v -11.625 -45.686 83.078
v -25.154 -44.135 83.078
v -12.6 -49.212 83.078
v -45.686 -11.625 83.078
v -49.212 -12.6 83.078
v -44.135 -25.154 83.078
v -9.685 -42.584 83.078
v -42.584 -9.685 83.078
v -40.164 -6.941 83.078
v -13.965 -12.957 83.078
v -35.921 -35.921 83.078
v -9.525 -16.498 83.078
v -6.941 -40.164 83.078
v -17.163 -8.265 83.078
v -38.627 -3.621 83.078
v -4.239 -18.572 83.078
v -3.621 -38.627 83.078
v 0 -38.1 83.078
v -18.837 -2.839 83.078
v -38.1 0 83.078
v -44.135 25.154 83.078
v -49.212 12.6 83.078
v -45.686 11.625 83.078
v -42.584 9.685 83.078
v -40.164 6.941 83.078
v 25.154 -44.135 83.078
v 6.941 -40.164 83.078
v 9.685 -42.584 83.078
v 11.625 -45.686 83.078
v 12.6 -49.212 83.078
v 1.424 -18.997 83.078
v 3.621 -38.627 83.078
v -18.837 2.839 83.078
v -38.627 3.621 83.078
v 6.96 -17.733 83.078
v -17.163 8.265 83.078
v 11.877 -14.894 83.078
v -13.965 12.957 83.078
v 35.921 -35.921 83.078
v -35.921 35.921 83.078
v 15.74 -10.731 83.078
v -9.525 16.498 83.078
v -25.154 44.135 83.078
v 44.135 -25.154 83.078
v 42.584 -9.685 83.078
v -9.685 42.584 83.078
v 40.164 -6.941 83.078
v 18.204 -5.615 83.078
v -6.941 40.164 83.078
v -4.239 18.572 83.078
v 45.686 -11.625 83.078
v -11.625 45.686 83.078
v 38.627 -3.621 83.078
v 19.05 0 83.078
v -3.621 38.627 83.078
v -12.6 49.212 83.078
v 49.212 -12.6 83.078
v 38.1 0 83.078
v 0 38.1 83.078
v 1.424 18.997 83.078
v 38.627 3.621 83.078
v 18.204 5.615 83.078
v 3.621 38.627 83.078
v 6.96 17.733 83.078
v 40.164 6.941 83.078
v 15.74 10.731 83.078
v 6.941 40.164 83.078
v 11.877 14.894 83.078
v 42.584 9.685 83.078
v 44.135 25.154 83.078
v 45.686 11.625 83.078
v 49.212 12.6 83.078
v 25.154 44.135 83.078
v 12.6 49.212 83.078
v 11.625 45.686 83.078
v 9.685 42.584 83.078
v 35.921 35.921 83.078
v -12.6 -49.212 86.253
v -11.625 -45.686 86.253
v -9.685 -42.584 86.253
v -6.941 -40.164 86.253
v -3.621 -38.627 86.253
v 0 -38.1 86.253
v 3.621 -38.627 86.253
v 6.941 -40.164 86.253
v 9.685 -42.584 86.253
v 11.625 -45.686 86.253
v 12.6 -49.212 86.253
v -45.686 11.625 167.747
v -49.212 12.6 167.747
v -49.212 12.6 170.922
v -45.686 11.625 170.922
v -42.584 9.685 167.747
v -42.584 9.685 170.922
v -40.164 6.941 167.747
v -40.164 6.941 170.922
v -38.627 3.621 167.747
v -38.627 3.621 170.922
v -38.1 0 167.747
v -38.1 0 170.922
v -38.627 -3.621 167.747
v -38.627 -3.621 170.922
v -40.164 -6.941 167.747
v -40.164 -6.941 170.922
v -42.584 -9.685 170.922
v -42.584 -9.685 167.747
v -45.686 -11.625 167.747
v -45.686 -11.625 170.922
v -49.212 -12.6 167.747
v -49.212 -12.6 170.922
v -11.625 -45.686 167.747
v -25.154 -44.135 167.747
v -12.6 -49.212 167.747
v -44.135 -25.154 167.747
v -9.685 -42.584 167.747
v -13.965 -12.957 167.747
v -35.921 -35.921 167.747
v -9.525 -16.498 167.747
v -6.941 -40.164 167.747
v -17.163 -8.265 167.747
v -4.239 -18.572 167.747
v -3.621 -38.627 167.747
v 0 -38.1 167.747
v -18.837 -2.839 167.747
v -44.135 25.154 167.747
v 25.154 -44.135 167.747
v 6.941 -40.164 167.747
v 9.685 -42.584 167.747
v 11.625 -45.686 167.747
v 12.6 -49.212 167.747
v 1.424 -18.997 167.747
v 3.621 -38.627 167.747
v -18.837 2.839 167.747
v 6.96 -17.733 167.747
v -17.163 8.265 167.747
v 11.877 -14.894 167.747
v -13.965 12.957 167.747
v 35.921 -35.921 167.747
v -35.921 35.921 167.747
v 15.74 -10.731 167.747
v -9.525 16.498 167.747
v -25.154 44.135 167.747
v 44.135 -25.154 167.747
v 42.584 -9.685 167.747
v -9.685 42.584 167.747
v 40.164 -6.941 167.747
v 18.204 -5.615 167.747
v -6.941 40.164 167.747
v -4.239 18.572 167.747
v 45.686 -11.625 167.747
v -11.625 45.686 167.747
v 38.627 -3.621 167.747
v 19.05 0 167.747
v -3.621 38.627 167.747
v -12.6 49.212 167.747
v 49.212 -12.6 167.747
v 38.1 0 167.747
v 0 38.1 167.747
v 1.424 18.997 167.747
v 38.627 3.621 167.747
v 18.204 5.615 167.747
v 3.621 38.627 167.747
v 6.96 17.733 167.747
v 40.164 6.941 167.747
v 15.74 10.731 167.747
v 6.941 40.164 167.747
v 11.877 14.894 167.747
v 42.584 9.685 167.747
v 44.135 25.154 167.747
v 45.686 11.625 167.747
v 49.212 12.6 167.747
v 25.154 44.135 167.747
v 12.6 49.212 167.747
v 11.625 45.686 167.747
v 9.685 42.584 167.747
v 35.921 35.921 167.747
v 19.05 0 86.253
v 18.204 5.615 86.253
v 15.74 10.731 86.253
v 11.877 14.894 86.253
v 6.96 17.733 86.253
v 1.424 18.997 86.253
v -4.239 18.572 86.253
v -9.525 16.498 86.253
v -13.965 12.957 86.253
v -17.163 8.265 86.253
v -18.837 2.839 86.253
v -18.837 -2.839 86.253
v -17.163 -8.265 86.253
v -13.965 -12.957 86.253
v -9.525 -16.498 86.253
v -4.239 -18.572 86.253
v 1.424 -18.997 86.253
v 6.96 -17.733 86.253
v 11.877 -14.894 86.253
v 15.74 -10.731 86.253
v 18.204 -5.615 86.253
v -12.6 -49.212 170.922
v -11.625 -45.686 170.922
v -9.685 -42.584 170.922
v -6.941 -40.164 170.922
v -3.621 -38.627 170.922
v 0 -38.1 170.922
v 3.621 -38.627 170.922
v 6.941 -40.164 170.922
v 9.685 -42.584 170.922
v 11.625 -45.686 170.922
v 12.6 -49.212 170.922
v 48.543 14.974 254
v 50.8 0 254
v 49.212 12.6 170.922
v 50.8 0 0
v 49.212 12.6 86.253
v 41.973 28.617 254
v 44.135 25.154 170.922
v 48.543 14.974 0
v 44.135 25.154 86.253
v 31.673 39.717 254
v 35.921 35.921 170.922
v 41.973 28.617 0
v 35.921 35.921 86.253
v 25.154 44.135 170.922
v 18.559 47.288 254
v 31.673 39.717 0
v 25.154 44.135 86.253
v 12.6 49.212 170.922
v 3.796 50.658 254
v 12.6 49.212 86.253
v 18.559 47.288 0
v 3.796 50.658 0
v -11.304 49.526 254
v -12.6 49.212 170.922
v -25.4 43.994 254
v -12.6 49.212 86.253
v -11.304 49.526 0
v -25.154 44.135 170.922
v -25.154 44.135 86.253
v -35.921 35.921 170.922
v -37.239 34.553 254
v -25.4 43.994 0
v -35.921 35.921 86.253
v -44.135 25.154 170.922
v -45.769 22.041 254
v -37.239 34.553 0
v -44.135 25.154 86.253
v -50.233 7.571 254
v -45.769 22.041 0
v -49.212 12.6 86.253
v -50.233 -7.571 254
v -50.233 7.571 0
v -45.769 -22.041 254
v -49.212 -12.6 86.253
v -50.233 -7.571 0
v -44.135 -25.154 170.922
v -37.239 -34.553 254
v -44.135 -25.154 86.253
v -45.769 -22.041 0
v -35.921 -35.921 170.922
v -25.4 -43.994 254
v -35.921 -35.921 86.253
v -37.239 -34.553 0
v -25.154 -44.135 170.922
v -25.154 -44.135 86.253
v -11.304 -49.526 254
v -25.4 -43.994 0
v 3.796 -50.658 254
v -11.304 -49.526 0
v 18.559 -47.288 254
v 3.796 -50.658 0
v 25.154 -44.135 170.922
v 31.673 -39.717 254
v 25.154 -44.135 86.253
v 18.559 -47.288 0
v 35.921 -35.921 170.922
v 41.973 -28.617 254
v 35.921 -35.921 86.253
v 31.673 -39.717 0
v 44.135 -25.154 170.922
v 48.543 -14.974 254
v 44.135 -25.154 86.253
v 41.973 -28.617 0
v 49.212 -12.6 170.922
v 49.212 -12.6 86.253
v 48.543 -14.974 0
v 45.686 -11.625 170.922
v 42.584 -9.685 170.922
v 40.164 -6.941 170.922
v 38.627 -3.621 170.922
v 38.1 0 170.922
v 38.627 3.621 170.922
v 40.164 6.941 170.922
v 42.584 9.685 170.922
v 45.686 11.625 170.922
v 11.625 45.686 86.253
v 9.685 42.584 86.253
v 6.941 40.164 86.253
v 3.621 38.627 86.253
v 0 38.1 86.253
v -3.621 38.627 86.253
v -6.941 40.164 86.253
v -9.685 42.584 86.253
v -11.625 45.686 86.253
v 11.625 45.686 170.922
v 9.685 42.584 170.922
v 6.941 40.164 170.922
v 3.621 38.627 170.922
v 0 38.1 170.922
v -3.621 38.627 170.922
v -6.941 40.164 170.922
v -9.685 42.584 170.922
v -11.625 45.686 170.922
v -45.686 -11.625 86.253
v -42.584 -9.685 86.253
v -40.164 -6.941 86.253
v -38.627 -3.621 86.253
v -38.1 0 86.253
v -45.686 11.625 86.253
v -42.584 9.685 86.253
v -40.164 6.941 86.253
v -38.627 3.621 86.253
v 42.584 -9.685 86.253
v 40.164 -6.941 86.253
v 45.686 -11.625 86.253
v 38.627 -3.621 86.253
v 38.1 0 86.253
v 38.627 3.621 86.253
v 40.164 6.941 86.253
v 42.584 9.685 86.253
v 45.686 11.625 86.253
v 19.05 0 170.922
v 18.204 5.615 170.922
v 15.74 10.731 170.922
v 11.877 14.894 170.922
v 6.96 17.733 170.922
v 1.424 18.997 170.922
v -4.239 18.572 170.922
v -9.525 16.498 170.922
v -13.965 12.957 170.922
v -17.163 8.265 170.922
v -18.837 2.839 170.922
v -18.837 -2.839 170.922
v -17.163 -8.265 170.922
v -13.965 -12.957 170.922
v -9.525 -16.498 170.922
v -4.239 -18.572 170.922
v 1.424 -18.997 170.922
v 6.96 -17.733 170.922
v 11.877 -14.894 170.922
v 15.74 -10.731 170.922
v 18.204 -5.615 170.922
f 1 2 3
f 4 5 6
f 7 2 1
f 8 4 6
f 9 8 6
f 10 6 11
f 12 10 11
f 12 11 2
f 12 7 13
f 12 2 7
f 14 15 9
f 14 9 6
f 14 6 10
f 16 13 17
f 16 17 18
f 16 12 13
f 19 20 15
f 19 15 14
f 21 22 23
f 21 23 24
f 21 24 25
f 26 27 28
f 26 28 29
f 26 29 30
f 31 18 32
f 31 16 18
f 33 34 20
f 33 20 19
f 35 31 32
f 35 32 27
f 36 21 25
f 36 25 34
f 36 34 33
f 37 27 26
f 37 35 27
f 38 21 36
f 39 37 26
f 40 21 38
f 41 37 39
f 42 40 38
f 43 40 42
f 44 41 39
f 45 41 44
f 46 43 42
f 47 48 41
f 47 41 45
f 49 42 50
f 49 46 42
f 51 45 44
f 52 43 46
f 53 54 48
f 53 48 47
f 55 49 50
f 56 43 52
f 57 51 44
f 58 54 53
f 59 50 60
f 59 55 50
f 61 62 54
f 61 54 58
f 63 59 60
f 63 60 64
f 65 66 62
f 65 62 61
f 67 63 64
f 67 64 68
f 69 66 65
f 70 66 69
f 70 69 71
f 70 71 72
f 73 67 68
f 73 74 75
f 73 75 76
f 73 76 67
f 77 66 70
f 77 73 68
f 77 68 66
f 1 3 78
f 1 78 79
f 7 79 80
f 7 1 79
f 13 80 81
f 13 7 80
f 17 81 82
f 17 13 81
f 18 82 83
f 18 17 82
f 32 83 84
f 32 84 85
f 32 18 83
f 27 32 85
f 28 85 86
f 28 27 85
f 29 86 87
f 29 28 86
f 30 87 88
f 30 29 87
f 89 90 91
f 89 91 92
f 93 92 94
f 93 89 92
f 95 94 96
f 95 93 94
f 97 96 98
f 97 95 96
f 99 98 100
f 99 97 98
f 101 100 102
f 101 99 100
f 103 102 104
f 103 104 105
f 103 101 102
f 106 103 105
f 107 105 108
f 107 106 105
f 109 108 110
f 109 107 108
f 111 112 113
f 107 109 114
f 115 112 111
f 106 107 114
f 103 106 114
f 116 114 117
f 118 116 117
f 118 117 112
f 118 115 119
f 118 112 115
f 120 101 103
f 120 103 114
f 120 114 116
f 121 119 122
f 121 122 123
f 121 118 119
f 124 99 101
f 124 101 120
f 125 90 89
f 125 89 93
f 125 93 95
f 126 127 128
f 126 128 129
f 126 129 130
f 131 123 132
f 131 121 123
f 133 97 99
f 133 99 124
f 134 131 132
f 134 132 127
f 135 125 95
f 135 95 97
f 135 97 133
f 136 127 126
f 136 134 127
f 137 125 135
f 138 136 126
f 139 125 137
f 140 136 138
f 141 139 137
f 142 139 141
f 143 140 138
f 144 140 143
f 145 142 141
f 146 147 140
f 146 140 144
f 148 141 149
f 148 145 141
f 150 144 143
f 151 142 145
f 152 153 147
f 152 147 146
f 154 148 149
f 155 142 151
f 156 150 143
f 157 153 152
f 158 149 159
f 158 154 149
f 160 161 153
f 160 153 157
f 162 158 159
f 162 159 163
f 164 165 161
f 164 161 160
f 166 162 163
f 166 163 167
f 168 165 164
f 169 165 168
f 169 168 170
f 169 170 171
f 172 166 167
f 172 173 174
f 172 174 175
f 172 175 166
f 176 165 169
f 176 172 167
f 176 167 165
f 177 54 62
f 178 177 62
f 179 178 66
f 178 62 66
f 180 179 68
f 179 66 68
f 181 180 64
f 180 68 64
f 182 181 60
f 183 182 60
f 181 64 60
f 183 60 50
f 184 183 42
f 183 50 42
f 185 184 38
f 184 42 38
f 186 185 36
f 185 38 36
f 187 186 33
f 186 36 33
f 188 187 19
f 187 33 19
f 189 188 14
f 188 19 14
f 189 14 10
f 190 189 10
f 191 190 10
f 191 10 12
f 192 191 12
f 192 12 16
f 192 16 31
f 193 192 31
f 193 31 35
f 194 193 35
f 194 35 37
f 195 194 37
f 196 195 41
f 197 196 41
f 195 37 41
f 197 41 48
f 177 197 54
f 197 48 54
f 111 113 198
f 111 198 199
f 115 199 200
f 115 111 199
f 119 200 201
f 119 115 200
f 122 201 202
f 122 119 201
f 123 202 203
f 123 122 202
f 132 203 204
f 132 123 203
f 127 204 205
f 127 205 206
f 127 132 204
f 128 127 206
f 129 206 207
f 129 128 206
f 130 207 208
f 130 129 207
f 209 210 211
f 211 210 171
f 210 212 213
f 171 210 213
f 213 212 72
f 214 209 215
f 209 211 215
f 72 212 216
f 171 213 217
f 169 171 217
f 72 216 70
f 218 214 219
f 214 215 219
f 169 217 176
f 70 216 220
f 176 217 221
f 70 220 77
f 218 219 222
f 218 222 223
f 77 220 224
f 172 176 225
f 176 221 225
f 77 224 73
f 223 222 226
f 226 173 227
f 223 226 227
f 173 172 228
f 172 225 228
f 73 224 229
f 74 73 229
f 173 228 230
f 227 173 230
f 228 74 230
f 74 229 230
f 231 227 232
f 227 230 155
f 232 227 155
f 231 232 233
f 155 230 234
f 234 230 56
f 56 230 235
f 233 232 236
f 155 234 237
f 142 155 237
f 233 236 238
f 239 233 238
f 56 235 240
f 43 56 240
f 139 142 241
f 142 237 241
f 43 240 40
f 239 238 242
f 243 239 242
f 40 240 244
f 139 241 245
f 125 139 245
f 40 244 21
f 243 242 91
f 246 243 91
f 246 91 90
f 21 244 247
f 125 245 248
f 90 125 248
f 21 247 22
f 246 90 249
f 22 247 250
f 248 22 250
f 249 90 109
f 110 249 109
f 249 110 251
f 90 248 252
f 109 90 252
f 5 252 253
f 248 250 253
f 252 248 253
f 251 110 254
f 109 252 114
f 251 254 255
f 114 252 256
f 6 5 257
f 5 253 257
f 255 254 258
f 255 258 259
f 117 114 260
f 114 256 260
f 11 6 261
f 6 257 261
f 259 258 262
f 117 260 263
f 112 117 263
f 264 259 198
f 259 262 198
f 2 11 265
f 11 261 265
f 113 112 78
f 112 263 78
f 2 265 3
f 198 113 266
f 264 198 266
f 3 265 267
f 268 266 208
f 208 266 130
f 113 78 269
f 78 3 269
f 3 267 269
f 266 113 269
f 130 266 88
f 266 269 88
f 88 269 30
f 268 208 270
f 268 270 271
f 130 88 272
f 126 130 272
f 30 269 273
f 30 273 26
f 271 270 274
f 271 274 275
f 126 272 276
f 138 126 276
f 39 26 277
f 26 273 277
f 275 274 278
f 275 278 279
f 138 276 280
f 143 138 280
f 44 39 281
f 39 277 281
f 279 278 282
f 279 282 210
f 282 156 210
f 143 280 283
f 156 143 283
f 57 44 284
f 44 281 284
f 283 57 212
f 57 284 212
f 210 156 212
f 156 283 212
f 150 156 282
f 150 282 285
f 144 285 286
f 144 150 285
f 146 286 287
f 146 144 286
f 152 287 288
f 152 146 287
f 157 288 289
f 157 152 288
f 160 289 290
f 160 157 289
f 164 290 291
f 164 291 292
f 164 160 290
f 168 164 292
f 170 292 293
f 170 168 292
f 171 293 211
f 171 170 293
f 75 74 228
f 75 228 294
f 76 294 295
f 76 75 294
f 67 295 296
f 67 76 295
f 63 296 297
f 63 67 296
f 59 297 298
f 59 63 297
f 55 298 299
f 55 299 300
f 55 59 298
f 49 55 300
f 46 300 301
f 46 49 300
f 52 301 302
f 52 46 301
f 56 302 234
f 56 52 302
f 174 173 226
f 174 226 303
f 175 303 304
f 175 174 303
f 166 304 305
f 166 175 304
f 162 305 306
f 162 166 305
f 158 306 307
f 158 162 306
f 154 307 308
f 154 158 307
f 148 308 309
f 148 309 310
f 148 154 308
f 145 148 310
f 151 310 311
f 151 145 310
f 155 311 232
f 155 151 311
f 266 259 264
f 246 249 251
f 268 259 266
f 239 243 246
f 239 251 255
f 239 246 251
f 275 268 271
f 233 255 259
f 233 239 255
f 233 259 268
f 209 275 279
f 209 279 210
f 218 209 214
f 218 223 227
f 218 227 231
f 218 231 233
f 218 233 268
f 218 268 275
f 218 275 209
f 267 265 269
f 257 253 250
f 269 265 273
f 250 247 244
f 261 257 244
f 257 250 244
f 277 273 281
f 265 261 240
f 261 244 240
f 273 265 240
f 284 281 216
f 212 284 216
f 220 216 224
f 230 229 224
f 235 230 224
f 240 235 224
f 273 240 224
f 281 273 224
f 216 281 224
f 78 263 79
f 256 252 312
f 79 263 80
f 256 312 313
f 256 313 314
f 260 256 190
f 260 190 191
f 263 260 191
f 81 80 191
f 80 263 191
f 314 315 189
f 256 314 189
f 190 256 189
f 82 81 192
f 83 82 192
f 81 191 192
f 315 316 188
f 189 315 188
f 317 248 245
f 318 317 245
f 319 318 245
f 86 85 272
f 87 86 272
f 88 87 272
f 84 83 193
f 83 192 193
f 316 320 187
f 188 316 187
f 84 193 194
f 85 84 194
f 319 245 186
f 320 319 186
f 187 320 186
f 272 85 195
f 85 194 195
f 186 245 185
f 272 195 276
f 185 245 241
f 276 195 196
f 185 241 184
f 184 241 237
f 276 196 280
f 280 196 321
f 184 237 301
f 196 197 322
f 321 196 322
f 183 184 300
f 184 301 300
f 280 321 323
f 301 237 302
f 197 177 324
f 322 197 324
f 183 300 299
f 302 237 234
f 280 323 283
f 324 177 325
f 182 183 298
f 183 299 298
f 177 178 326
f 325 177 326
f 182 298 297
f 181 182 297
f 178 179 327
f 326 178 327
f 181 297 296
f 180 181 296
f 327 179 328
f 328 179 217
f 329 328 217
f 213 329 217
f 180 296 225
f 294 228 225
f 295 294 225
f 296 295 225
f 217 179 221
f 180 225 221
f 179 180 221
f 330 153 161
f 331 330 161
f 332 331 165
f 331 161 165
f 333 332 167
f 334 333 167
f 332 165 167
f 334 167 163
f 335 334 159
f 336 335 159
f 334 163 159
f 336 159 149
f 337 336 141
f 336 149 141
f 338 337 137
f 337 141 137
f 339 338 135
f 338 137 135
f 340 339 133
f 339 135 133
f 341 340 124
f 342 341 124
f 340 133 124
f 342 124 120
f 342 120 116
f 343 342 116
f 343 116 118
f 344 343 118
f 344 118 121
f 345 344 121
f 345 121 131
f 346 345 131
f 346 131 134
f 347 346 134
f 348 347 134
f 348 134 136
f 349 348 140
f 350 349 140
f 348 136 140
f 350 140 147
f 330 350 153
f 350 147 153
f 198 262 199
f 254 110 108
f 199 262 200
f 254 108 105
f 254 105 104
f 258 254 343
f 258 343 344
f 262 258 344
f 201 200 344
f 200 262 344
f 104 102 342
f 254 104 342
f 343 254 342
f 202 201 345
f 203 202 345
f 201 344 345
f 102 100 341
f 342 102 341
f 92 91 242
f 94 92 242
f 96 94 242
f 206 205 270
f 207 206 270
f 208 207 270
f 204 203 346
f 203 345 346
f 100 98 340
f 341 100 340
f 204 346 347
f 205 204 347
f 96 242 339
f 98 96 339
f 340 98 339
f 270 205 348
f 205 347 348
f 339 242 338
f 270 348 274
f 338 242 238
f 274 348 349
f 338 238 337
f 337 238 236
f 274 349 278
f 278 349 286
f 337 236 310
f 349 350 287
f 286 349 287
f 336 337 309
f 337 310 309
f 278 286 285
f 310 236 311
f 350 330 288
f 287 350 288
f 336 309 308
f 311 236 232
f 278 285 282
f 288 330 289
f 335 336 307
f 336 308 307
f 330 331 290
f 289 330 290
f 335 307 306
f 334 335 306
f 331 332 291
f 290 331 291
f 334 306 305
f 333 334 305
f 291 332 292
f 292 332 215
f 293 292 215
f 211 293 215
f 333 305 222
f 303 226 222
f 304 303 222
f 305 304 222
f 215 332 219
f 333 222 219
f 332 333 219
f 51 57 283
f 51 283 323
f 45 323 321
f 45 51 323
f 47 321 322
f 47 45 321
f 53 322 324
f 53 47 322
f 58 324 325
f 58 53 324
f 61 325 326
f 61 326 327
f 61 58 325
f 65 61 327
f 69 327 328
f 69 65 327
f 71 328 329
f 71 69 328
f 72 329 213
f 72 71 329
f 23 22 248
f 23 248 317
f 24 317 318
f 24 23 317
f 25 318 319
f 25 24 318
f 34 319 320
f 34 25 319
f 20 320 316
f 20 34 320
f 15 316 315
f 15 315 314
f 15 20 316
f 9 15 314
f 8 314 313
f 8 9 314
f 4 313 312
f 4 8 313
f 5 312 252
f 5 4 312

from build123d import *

# Parameters (mm, degrees)
SKETCH1_R           = 50.8
BOSS_EXTRUDE1_DEPTH = 254
CUT_EXTRUDE1_START  = -86.25332
SKETCH2_R           = 19.05
CUT_EXTRUDE1_DEPTH  = 3.175
CUT_EXTRUDE2_START  = 83.07832
SKETCH4_R           = 19.05
CUT_EXTRUDE2_DEPTH  = 3.175


with BuildPart() as part:
    # Sketch1 → Boss-Extrude1 (new body)
    with BuildSketch(Plane.XY):
        Circle(SKETCH1_R)
    extrude(amount=BOSS_EXTRUDE1_DEPTH)

    # Sketch2 → Cut-Extrude1 (cut)
    with BuildSketch(Plane.XY.offset(254).offset(CUT_EXTRUDE1_START)):
        with BuildLine():
            ThreePointArc((-12.600390619, 49.2125), (-35.921024484, 35.921024484), (-49.2125, 12.600390619))
            ThreePointArc((-49.2125, 12.600390619), (-38.1, 0), (-49.2125, -12.600390619))
            ThreePointArc((-49.2125, -12.600390619), (-35.921024484, -35.921024484), (-12.600390619, -49.2125))
            ThreePointArc((-12.600390619, -49.2125), (0, -38.1), (12.600390619, -49.2125))
            ThreePointArc((12.600390619, -49.2125), (35.921024484, -35.921024484), (49.2125, -12.600390619))
            ThreePointArc((49.2125, -12.600390619), (38.1, 0), (49.2125, 12.600390619))
            ThreePointArc((49.2125, 12.600390619), (35.921024484, 35.921024484), (12.600390619, 49.2125))
            ThreePointArc((12.600390619, 49.2125), (0, 38.1), (-12.600390619, 49.2125))
        make_face()
        Circle(SKETCH2_R, mode=Mode.SUBTRACT)
    extrude(amount=CUT_EXTRUDE1_DEPTH, mode=Mode.SUBTRACT)

    # Sketch4 → Cut-Extrude2 (cut)
    with BuildSketch(Plane.XY.offset(CUT_EXTRUDE2_START)):
        with BuildLine():
            ThreePointArc((-12.600390619, 49.2125), (-35.921024484, 35.921024484), (-49.2125, 12.600390619))
            ThreePointArc((-49.2125, 12.600390619), (-38.1, 0), (-49.2125, -12.600390619))
            ThreePointArc((-49.2125, -12.600390619), (-35.921024484, -35.921024484), (-12.600390619, -49.2125))
            ThreePointArc((-12.600390619, -49.2125), (0, -38.1), (12.600390619, -49.2125))
            ThreePointArc((12.600390619, -49.2125), (35.921024484, -35.921024484), (49.2125, -12.600390619))
            ThreePointArc((49.2125, -12.600390619), (38.1, 0), (49.2125, 12.600390619))
            ThreePointArc((49.2125, 12.600390619), (35.921024484, 35.921024484), (12.600390619, 49.2125))
            ThreePointArc((12.600390619, 49.2125), (0, 38.1), (-12.600390619, 49.2125))
        make_face()
        Circle(SKETCH4_R, mode=Mode.SUBTRACT)
    extrude(amount=CUT_EXTRUDE2_DEPTH, mode=Mode.SUBTRACT)


solid = part.part
